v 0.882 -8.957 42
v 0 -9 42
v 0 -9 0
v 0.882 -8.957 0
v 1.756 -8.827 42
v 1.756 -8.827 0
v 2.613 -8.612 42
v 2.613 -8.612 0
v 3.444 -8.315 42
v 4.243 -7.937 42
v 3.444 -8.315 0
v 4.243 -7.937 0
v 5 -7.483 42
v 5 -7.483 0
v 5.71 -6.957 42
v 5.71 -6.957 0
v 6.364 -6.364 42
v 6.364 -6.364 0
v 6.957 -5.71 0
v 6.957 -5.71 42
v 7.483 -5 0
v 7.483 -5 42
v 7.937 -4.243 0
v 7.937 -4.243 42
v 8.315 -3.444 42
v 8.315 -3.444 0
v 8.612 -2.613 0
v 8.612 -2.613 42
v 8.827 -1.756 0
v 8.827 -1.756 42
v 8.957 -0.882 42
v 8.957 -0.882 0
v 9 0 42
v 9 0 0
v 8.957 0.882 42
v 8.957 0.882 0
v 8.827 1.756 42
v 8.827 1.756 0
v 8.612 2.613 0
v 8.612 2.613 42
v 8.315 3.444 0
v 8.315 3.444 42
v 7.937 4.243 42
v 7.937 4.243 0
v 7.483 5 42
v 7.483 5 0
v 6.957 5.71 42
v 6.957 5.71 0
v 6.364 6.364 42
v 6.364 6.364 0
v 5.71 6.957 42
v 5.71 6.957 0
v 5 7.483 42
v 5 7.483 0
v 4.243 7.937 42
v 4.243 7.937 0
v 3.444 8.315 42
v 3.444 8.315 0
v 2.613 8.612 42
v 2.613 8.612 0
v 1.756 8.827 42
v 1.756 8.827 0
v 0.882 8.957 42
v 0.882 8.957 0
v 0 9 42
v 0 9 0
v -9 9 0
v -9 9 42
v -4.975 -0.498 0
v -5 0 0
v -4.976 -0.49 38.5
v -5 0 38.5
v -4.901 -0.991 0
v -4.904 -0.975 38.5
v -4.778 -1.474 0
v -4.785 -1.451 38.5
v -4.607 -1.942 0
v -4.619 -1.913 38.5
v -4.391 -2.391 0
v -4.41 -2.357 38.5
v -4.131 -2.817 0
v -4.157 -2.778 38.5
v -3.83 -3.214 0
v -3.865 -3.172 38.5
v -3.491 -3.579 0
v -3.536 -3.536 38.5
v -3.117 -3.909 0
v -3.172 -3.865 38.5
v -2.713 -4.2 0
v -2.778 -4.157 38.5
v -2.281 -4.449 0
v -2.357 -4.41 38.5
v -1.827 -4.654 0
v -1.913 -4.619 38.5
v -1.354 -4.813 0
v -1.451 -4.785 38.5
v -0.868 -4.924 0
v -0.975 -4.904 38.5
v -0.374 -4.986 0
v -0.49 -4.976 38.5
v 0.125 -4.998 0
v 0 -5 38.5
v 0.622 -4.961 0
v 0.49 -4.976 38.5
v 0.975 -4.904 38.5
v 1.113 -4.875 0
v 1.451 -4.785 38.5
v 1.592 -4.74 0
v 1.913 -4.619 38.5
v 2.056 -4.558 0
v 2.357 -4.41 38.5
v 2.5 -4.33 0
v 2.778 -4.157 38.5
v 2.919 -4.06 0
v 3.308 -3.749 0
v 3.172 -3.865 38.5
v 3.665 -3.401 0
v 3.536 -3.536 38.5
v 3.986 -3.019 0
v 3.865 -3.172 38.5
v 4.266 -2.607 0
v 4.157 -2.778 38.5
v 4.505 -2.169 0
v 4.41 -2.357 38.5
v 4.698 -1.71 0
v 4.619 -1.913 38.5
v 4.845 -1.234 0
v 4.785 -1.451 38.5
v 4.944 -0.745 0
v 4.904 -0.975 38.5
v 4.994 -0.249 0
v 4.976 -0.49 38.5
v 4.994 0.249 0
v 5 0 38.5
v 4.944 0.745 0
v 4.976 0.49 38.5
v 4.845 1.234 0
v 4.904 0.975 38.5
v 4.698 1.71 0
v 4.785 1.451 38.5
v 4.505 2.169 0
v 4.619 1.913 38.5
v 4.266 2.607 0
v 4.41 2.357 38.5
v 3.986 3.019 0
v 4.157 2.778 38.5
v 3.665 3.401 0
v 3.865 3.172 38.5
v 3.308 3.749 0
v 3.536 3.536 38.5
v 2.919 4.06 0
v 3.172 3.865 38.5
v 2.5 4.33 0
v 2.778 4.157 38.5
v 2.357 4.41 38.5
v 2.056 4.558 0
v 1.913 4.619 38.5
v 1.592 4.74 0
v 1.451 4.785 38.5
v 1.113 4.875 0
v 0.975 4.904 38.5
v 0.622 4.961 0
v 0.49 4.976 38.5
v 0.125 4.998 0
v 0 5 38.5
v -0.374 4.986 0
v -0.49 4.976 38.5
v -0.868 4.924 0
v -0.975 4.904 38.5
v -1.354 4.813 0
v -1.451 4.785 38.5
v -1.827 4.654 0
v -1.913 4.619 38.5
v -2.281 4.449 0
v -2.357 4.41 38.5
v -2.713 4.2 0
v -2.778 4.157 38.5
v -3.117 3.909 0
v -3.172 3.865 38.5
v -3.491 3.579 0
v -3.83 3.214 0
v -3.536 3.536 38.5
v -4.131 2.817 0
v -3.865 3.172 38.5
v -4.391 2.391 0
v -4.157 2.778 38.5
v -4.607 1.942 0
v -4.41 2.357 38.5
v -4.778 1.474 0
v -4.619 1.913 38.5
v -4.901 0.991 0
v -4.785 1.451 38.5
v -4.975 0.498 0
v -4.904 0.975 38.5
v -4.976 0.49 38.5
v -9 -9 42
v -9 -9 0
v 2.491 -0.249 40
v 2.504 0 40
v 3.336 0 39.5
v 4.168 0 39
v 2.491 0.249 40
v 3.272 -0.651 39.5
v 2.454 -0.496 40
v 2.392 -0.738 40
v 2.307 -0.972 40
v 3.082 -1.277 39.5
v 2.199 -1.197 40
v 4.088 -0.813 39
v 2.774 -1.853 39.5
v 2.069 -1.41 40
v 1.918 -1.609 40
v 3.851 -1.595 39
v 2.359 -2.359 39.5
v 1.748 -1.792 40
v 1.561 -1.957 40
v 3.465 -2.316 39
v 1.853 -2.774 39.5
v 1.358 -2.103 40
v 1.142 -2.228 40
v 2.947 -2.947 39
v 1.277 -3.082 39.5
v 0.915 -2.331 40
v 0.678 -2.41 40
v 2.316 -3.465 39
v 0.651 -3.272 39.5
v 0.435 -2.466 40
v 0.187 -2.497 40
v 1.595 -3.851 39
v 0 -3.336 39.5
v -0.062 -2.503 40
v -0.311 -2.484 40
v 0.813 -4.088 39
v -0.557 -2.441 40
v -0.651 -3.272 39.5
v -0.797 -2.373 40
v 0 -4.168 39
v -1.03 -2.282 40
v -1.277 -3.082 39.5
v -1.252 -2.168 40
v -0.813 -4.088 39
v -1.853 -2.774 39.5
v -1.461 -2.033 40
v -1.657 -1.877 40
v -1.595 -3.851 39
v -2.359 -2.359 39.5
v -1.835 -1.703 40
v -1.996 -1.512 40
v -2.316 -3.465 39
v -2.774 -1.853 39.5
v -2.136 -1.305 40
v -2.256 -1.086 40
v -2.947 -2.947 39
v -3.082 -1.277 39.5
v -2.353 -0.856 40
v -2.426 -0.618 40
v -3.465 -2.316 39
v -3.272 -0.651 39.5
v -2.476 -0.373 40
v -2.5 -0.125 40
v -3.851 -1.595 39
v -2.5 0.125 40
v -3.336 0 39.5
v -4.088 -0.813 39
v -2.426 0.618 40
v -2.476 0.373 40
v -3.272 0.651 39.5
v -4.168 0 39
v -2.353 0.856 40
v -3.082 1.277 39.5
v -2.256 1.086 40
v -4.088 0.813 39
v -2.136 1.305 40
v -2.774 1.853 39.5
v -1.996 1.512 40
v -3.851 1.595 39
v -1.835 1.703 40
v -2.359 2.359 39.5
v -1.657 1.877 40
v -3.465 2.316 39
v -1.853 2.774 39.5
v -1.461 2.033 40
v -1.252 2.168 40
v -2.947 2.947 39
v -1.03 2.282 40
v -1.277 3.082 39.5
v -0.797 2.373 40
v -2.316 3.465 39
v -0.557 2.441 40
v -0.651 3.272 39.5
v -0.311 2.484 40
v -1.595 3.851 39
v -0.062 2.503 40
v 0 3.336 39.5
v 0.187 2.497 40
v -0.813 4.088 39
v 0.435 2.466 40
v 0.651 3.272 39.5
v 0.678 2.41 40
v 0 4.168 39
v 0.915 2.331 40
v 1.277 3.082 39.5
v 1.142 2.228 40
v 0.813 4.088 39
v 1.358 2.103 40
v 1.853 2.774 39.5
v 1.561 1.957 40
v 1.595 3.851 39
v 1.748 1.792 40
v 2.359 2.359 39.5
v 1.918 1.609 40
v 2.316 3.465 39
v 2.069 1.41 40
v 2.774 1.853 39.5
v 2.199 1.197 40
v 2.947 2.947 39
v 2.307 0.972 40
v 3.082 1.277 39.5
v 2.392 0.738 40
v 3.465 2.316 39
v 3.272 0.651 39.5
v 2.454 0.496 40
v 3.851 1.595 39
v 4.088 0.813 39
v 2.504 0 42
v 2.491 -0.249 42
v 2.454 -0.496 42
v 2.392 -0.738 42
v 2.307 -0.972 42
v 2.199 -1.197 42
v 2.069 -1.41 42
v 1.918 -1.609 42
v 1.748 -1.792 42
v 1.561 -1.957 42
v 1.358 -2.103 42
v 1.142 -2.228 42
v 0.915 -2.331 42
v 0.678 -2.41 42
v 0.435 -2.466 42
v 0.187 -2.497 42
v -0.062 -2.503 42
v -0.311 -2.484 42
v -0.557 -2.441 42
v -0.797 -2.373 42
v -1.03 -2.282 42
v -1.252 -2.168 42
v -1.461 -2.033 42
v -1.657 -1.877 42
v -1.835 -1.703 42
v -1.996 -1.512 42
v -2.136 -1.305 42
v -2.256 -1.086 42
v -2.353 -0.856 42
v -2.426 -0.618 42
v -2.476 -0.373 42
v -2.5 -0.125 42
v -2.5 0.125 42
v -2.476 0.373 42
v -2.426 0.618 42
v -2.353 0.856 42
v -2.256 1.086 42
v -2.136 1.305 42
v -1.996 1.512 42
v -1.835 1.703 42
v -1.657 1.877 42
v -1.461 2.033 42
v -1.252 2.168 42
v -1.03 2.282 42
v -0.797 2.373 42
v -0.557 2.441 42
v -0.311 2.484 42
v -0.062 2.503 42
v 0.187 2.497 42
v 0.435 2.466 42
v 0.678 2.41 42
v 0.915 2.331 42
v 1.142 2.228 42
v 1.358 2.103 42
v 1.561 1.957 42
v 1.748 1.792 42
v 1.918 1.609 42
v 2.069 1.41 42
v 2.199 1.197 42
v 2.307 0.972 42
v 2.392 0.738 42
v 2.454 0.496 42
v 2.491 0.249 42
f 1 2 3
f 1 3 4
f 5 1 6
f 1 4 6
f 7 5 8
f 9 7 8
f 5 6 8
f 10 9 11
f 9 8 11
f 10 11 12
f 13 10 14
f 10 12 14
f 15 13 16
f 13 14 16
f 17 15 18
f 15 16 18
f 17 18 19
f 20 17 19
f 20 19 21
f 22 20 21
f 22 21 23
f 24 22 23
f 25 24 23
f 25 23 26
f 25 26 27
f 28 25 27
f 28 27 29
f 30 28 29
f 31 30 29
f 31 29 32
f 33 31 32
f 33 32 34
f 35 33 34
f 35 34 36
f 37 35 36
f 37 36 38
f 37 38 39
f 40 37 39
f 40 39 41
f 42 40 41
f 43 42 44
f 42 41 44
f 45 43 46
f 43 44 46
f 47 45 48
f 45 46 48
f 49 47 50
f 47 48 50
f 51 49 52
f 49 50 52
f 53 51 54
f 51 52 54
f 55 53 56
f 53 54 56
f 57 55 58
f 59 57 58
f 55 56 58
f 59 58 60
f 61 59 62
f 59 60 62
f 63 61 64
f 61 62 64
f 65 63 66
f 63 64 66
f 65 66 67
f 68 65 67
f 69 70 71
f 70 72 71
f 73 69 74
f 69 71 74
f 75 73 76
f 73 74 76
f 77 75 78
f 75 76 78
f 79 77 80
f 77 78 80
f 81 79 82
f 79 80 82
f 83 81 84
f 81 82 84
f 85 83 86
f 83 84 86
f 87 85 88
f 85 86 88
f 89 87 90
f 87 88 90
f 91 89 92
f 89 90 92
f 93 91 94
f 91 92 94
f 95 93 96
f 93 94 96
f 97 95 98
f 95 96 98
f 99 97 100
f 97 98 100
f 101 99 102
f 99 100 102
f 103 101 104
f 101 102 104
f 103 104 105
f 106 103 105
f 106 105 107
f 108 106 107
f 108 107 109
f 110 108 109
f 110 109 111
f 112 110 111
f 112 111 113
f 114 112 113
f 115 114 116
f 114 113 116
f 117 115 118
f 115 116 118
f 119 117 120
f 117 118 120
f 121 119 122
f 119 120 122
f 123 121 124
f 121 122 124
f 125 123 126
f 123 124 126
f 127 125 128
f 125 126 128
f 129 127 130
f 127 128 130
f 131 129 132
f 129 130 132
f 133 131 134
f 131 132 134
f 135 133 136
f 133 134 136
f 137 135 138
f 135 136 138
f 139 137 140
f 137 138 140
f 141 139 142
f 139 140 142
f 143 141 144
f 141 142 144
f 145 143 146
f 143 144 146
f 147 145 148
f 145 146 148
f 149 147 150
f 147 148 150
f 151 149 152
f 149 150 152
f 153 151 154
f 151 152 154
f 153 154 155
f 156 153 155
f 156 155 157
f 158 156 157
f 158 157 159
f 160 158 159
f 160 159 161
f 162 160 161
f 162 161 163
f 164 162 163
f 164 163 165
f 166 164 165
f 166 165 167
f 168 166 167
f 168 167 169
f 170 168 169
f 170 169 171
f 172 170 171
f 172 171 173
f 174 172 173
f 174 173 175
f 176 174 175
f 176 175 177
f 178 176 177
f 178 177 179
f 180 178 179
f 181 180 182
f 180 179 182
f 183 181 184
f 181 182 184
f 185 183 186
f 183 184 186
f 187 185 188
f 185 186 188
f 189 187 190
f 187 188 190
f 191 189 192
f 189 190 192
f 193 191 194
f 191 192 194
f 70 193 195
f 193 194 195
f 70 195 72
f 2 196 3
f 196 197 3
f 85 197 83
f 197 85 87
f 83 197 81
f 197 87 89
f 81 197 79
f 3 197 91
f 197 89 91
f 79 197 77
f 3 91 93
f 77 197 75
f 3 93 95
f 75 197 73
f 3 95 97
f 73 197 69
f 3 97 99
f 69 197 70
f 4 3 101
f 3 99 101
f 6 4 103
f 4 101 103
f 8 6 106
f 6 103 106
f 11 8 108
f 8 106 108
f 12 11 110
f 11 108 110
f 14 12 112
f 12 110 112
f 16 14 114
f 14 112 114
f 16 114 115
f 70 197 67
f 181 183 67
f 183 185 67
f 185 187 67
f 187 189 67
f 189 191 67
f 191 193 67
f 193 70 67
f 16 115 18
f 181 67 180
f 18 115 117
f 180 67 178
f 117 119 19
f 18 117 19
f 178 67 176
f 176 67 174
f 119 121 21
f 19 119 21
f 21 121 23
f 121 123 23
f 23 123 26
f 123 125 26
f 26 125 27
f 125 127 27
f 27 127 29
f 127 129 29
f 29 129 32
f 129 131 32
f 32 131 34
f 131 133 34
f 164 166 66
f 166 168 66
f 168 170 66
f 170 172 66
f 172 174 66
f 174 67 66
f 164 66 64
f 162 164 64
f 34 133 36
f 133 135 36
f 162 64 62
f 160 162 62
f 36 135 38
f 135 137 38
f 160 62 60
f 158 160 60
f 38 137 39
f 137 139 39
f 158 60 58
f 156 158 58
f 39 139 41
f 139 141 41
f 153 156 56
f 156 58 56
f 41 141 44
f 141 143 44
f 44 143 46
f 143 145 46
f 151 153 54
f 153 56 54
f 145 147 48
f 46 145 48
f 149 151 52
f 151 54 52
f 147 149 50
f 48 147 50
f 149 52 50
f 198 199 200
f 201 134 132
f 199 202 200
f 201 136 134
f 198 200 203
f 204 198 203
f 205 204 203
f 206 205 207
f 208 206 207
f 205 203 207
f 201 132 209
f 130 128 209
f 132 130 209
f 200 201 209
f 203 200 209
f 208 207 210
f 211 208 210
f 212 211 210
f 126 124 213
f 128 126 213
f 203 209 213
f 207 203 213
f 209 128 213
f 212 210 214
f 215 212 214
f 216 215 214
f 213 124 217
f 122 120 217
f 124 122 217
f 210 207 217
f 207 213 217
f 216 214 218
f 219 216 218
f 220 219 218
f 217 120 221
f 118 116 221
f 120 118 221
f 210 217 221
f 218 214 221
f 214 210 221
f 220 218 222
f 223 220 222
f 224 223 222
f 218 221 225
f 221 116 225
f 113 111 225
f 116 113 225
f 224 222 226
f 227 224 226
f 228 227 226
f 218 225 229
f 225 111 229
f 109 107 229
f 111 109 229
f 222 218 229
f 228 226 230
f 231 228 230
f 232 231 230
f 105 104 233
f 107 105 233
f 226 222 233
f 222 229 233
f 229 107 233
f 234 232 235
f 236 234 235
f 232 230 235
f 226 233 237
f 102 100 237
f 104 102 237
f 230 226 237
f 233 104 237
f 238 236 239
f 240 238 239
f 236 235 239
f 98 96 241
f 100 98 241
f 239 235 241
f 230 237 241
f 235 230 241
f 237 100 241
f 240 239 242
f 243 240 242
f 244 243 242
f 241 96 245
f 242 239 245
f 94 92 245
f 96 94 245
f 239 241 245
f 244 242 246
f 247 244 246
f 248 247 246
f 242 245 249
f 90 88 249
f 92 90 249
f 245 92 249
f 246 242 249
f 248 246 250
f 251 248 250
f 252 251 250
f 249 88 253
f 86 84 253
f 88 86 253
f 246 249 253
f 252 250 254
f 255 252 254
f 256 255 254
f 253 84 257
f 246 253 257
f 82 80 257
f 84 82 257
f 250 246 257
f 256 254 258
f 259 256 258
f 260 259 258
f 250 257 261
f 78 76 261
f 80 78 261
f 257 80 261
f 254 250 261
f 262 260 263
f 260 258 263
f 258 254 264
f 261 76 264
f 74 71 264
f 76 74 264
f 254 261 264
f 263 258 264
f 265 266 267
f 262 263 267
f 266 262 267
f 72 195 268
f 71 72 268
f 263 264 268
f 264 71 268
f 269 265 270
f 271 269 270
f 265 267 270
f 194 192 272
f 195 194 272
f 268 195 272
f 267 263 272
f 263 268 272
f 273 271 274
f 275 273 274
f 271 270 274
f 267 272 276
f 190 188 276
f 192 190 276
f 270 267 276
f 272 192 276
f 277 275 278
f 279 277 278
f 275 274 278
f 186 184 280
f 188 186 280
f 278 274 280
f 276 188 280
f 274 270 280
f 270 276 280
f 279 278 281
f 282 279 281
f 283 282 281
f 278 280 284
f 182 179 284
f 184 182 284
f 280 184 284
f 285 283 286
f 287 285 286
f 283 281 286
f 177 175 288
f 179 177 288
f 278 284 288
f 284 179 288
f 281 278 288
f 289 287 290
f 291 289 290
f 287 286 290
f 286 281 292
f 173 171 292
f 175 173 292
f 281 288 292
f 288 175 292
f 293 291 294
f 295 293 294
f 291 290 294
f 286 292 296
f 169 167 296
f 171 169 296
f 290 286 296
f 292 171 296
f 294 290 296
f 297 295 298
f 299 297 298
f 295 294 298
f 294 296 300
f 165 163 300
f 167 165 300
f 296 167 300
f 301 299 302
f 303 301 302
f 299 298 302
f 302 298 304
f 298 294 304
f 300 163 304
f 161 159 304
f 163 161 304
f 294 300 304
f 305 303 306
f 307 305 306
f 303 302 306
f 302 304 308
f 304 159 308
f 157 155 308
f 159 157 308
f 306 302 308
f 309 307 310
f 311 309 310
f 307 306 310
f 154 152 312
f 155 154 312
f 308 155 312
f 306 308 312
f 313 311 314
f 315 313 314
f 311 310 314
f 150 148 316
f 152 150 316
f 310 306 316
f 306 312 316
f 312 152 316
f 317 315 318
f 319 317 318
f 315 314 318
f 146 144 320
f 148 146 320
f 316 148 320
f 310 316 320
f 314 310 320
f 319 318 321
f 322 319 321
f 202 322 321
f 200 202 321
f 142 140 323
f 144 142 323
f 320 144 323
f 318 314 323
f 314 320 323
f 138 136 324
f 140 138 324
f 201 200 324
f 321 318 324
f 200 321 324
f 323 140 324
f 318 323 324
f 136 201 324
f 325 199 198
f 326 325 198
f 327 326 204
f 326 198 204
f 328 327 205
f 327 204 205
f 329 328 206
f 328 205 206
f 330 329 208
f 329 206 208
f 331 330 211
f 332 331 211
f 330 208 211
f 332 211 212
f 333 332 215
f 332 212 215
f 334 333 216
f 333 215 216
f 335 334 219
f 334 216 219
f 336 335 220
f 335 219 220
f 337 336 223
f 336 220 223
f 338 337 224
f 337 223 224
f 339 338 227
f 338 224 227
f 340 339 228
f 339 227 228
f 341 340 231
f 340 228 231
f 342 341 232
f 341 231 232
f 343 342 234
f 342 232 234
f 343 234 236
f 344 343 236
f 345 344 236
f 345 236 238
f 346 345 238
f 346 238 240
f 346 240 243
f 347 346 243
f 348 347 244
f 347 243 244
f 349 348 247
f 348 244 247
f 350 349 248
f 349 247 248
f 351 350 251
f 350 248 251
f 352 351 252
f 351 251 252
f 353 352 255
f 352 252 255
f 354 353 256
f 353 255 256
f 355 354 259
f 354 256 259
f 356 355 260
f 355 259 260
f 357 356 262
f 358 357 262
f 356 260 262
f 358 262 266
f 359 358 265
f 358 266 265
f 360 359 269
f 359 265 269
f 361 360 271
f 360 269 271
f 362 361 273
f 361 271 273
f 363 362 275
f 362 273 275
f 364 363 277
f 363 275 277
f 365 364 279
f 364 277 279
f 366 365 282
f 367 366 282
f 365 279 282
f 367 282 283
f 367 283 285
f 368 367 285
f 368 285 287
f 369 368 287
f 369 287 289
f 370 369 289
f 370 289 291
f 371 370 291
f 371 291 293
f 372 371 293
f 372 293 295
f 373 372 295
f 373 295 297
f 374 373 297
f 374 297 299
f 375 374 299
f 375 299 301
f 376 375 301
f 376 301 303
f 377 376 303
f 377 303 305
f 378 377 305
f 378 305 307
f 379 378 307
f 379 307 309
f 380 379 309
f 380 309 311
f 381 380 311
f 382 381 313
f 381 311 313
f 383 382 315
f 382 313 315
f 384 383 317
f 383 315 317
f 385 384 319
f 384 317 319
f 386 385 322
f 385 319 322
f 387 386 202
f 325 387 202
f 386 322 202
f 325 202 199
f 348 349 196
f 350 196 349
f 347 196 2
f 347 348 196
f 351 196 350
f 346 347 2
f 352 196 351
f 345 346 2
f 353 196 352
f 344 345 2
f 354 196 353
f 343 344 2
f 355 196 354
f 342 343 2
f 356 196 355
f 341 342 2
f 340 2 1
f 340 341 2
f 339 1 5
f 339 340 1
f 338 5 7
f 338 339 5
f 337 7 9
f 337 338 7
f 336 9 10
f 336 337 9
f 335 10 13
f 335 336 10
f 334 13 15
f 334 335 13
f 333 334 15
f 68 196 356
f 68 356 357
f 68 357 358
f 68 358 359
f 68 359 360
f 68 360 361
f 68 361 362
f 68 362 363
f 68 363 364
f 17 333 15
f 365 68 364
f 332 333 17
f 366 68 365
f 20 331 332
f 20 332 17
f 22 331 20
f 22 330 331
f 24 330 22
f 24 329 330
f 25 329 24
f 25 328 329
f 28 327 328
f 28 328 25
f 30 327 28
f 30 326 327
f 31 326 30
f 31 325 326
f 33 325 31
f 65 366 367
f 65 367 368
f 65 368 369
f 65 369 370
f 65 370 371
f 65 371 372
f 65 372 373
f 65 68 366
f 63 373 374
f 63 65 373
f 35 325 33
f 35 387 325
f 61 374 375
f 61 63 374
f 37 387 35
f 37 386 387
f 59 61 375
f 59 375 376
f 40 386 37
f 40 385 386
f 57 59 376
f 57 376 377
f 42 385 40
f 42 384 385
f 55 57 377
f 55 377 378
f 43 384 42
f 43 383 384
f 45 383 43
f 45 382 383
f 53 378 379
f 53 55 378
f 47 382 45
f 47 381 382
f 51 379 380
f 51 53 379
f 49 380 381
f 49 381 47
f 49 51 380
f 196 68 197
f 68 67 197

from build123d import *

# Parameters (mm, degrees)
F1_DEPTH = 40
F3_D     = 10
F3_DEPTH = 38.5
F3_TIP   = 3.0043030951
F4_DEPTH = 2


with BuildPart() as f1:
    # F0 (on Top) → F1 (new body)
    with BuildSketch(Plane.XY):
        with BuildLine():
            ThreePointArc((0, -5), (-5, 0), (0, 5))
            Line((0, 5), (0, 9))
            ThreePointArc((0, 9), (-6.3639610307, 6.3639610307), (-9, 0))
            ThreePointArc((-9, 0), (-6.3639610307, -6.3639610307), (0, -9))
            Line((0, -9), (0, -5))
        make_face()
        with BuildLine():
            ThreePointArc((-9, 0), (-6.3639610307, 6.3639610307), (0, 9))
            Line((0, 9), (-9, 9))
            Line((-9, 9), (-9, 0))
        make_face()
        with BuildLine():
            Line((-9, -9), (0, -9))
            ThreePointArc((0, -9), (-6.3639610307, -6.3639610307), (-9, 0))
            Line((-9, 0), (-9, -9))
        make_face()
        with BuildLine():
            ThreePointArc((0, 5), (3.5355339059, 3.5355339059), (5, 0))
            ThreePointArc((5, 0), (3.5355339059, -3.5355339059), (0, -5))
            Line((0, -5), (0, -9))
            ThreePointArc((0, -9), (6.3639610307, -6.3639610307), (9, 0))
            ThreePointArc((9, 0), (6.3639610307, 6.3639610307), (0, 9))
            Line((0, 9), (0, 5))
        make_face()
        with BuildLine():
            Line((0, -5), (0, 5))
            ThreePointArc((0, 5), (-5, 0), (0, -5))
        make_face()
        with BuildLine():
            ThreePointArc((0, -5), (3.5355339059, -3.5355339059), (5, 0))
            ThreePointArc((5, 0), (3.5355339059, 3.5355339059), (0, 5))
            Line((0, 5), (0, -5))
        make_face()
    extrude(amount=F1_DEPTH)

    # F3
    with Locations(Plane(origin=(0, 0, 0), x_dir=(1, 0, 0), z_dir=(0, 0, -1))):
        with Locations((0, 0)):
            Hole(F3_D / 2, depth=F3_DEPTH)
            with Locations((0, 0, -(F3_DEPTH + F3_TIP / 2))):  # 118° drill point
                Cone(0, F3_D / 2, F3_TIP, mode=Mode.SUBTRACT)

    # F4 (add): a face of the model
    f4_faces = [f1.faces().sort_by_distance(p)[0] for p in [
        (-4.5, 8.7454415588, 40),
    ]]
    extrude(f4_faces, amount=F4_DEPTH)


solid = f1.part
